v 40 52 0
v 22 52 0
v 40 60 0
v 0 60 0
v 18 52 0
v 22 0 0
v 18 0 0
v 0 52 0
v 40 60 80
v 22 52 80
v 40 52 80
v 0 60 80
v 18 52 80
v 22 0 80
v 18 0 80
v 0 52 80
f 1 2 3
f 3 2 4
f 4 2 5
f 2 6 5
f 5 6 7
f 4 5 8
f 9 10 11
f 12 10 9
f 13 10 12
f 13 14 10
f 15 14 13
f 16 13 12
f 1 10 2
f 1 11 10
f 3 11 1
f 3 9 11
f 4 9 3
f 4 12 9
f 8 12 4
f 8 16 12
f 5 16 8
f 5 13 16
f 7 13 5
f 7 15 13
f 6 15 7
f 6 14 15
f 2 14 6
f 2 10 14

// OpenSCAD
$fn = 32;

// ----------------------------------------------------------------------
// Structural section: tee 40 x 60 mm
// ----------------------------------------------------------------------

// --- parameters (mm) ---
sec_w = 40;               // tee width, X
sec_h = 60;               // tee height, Y
flange_t = 8;             // top flange thickness
web_t = 4;                // web thickness
plate_t = 80;             // cut length, Z (extrusion height)

profile = [[18, 0], [22, 0], [22, 52], [40, 52], [40, 60], [0, 60], [0, 52], [18, 52]];  // primary outline, 8 points, counter clockwise

// --- the one profile operation ---
linear_extrude(height = plate_t) polygon(points = profile);
